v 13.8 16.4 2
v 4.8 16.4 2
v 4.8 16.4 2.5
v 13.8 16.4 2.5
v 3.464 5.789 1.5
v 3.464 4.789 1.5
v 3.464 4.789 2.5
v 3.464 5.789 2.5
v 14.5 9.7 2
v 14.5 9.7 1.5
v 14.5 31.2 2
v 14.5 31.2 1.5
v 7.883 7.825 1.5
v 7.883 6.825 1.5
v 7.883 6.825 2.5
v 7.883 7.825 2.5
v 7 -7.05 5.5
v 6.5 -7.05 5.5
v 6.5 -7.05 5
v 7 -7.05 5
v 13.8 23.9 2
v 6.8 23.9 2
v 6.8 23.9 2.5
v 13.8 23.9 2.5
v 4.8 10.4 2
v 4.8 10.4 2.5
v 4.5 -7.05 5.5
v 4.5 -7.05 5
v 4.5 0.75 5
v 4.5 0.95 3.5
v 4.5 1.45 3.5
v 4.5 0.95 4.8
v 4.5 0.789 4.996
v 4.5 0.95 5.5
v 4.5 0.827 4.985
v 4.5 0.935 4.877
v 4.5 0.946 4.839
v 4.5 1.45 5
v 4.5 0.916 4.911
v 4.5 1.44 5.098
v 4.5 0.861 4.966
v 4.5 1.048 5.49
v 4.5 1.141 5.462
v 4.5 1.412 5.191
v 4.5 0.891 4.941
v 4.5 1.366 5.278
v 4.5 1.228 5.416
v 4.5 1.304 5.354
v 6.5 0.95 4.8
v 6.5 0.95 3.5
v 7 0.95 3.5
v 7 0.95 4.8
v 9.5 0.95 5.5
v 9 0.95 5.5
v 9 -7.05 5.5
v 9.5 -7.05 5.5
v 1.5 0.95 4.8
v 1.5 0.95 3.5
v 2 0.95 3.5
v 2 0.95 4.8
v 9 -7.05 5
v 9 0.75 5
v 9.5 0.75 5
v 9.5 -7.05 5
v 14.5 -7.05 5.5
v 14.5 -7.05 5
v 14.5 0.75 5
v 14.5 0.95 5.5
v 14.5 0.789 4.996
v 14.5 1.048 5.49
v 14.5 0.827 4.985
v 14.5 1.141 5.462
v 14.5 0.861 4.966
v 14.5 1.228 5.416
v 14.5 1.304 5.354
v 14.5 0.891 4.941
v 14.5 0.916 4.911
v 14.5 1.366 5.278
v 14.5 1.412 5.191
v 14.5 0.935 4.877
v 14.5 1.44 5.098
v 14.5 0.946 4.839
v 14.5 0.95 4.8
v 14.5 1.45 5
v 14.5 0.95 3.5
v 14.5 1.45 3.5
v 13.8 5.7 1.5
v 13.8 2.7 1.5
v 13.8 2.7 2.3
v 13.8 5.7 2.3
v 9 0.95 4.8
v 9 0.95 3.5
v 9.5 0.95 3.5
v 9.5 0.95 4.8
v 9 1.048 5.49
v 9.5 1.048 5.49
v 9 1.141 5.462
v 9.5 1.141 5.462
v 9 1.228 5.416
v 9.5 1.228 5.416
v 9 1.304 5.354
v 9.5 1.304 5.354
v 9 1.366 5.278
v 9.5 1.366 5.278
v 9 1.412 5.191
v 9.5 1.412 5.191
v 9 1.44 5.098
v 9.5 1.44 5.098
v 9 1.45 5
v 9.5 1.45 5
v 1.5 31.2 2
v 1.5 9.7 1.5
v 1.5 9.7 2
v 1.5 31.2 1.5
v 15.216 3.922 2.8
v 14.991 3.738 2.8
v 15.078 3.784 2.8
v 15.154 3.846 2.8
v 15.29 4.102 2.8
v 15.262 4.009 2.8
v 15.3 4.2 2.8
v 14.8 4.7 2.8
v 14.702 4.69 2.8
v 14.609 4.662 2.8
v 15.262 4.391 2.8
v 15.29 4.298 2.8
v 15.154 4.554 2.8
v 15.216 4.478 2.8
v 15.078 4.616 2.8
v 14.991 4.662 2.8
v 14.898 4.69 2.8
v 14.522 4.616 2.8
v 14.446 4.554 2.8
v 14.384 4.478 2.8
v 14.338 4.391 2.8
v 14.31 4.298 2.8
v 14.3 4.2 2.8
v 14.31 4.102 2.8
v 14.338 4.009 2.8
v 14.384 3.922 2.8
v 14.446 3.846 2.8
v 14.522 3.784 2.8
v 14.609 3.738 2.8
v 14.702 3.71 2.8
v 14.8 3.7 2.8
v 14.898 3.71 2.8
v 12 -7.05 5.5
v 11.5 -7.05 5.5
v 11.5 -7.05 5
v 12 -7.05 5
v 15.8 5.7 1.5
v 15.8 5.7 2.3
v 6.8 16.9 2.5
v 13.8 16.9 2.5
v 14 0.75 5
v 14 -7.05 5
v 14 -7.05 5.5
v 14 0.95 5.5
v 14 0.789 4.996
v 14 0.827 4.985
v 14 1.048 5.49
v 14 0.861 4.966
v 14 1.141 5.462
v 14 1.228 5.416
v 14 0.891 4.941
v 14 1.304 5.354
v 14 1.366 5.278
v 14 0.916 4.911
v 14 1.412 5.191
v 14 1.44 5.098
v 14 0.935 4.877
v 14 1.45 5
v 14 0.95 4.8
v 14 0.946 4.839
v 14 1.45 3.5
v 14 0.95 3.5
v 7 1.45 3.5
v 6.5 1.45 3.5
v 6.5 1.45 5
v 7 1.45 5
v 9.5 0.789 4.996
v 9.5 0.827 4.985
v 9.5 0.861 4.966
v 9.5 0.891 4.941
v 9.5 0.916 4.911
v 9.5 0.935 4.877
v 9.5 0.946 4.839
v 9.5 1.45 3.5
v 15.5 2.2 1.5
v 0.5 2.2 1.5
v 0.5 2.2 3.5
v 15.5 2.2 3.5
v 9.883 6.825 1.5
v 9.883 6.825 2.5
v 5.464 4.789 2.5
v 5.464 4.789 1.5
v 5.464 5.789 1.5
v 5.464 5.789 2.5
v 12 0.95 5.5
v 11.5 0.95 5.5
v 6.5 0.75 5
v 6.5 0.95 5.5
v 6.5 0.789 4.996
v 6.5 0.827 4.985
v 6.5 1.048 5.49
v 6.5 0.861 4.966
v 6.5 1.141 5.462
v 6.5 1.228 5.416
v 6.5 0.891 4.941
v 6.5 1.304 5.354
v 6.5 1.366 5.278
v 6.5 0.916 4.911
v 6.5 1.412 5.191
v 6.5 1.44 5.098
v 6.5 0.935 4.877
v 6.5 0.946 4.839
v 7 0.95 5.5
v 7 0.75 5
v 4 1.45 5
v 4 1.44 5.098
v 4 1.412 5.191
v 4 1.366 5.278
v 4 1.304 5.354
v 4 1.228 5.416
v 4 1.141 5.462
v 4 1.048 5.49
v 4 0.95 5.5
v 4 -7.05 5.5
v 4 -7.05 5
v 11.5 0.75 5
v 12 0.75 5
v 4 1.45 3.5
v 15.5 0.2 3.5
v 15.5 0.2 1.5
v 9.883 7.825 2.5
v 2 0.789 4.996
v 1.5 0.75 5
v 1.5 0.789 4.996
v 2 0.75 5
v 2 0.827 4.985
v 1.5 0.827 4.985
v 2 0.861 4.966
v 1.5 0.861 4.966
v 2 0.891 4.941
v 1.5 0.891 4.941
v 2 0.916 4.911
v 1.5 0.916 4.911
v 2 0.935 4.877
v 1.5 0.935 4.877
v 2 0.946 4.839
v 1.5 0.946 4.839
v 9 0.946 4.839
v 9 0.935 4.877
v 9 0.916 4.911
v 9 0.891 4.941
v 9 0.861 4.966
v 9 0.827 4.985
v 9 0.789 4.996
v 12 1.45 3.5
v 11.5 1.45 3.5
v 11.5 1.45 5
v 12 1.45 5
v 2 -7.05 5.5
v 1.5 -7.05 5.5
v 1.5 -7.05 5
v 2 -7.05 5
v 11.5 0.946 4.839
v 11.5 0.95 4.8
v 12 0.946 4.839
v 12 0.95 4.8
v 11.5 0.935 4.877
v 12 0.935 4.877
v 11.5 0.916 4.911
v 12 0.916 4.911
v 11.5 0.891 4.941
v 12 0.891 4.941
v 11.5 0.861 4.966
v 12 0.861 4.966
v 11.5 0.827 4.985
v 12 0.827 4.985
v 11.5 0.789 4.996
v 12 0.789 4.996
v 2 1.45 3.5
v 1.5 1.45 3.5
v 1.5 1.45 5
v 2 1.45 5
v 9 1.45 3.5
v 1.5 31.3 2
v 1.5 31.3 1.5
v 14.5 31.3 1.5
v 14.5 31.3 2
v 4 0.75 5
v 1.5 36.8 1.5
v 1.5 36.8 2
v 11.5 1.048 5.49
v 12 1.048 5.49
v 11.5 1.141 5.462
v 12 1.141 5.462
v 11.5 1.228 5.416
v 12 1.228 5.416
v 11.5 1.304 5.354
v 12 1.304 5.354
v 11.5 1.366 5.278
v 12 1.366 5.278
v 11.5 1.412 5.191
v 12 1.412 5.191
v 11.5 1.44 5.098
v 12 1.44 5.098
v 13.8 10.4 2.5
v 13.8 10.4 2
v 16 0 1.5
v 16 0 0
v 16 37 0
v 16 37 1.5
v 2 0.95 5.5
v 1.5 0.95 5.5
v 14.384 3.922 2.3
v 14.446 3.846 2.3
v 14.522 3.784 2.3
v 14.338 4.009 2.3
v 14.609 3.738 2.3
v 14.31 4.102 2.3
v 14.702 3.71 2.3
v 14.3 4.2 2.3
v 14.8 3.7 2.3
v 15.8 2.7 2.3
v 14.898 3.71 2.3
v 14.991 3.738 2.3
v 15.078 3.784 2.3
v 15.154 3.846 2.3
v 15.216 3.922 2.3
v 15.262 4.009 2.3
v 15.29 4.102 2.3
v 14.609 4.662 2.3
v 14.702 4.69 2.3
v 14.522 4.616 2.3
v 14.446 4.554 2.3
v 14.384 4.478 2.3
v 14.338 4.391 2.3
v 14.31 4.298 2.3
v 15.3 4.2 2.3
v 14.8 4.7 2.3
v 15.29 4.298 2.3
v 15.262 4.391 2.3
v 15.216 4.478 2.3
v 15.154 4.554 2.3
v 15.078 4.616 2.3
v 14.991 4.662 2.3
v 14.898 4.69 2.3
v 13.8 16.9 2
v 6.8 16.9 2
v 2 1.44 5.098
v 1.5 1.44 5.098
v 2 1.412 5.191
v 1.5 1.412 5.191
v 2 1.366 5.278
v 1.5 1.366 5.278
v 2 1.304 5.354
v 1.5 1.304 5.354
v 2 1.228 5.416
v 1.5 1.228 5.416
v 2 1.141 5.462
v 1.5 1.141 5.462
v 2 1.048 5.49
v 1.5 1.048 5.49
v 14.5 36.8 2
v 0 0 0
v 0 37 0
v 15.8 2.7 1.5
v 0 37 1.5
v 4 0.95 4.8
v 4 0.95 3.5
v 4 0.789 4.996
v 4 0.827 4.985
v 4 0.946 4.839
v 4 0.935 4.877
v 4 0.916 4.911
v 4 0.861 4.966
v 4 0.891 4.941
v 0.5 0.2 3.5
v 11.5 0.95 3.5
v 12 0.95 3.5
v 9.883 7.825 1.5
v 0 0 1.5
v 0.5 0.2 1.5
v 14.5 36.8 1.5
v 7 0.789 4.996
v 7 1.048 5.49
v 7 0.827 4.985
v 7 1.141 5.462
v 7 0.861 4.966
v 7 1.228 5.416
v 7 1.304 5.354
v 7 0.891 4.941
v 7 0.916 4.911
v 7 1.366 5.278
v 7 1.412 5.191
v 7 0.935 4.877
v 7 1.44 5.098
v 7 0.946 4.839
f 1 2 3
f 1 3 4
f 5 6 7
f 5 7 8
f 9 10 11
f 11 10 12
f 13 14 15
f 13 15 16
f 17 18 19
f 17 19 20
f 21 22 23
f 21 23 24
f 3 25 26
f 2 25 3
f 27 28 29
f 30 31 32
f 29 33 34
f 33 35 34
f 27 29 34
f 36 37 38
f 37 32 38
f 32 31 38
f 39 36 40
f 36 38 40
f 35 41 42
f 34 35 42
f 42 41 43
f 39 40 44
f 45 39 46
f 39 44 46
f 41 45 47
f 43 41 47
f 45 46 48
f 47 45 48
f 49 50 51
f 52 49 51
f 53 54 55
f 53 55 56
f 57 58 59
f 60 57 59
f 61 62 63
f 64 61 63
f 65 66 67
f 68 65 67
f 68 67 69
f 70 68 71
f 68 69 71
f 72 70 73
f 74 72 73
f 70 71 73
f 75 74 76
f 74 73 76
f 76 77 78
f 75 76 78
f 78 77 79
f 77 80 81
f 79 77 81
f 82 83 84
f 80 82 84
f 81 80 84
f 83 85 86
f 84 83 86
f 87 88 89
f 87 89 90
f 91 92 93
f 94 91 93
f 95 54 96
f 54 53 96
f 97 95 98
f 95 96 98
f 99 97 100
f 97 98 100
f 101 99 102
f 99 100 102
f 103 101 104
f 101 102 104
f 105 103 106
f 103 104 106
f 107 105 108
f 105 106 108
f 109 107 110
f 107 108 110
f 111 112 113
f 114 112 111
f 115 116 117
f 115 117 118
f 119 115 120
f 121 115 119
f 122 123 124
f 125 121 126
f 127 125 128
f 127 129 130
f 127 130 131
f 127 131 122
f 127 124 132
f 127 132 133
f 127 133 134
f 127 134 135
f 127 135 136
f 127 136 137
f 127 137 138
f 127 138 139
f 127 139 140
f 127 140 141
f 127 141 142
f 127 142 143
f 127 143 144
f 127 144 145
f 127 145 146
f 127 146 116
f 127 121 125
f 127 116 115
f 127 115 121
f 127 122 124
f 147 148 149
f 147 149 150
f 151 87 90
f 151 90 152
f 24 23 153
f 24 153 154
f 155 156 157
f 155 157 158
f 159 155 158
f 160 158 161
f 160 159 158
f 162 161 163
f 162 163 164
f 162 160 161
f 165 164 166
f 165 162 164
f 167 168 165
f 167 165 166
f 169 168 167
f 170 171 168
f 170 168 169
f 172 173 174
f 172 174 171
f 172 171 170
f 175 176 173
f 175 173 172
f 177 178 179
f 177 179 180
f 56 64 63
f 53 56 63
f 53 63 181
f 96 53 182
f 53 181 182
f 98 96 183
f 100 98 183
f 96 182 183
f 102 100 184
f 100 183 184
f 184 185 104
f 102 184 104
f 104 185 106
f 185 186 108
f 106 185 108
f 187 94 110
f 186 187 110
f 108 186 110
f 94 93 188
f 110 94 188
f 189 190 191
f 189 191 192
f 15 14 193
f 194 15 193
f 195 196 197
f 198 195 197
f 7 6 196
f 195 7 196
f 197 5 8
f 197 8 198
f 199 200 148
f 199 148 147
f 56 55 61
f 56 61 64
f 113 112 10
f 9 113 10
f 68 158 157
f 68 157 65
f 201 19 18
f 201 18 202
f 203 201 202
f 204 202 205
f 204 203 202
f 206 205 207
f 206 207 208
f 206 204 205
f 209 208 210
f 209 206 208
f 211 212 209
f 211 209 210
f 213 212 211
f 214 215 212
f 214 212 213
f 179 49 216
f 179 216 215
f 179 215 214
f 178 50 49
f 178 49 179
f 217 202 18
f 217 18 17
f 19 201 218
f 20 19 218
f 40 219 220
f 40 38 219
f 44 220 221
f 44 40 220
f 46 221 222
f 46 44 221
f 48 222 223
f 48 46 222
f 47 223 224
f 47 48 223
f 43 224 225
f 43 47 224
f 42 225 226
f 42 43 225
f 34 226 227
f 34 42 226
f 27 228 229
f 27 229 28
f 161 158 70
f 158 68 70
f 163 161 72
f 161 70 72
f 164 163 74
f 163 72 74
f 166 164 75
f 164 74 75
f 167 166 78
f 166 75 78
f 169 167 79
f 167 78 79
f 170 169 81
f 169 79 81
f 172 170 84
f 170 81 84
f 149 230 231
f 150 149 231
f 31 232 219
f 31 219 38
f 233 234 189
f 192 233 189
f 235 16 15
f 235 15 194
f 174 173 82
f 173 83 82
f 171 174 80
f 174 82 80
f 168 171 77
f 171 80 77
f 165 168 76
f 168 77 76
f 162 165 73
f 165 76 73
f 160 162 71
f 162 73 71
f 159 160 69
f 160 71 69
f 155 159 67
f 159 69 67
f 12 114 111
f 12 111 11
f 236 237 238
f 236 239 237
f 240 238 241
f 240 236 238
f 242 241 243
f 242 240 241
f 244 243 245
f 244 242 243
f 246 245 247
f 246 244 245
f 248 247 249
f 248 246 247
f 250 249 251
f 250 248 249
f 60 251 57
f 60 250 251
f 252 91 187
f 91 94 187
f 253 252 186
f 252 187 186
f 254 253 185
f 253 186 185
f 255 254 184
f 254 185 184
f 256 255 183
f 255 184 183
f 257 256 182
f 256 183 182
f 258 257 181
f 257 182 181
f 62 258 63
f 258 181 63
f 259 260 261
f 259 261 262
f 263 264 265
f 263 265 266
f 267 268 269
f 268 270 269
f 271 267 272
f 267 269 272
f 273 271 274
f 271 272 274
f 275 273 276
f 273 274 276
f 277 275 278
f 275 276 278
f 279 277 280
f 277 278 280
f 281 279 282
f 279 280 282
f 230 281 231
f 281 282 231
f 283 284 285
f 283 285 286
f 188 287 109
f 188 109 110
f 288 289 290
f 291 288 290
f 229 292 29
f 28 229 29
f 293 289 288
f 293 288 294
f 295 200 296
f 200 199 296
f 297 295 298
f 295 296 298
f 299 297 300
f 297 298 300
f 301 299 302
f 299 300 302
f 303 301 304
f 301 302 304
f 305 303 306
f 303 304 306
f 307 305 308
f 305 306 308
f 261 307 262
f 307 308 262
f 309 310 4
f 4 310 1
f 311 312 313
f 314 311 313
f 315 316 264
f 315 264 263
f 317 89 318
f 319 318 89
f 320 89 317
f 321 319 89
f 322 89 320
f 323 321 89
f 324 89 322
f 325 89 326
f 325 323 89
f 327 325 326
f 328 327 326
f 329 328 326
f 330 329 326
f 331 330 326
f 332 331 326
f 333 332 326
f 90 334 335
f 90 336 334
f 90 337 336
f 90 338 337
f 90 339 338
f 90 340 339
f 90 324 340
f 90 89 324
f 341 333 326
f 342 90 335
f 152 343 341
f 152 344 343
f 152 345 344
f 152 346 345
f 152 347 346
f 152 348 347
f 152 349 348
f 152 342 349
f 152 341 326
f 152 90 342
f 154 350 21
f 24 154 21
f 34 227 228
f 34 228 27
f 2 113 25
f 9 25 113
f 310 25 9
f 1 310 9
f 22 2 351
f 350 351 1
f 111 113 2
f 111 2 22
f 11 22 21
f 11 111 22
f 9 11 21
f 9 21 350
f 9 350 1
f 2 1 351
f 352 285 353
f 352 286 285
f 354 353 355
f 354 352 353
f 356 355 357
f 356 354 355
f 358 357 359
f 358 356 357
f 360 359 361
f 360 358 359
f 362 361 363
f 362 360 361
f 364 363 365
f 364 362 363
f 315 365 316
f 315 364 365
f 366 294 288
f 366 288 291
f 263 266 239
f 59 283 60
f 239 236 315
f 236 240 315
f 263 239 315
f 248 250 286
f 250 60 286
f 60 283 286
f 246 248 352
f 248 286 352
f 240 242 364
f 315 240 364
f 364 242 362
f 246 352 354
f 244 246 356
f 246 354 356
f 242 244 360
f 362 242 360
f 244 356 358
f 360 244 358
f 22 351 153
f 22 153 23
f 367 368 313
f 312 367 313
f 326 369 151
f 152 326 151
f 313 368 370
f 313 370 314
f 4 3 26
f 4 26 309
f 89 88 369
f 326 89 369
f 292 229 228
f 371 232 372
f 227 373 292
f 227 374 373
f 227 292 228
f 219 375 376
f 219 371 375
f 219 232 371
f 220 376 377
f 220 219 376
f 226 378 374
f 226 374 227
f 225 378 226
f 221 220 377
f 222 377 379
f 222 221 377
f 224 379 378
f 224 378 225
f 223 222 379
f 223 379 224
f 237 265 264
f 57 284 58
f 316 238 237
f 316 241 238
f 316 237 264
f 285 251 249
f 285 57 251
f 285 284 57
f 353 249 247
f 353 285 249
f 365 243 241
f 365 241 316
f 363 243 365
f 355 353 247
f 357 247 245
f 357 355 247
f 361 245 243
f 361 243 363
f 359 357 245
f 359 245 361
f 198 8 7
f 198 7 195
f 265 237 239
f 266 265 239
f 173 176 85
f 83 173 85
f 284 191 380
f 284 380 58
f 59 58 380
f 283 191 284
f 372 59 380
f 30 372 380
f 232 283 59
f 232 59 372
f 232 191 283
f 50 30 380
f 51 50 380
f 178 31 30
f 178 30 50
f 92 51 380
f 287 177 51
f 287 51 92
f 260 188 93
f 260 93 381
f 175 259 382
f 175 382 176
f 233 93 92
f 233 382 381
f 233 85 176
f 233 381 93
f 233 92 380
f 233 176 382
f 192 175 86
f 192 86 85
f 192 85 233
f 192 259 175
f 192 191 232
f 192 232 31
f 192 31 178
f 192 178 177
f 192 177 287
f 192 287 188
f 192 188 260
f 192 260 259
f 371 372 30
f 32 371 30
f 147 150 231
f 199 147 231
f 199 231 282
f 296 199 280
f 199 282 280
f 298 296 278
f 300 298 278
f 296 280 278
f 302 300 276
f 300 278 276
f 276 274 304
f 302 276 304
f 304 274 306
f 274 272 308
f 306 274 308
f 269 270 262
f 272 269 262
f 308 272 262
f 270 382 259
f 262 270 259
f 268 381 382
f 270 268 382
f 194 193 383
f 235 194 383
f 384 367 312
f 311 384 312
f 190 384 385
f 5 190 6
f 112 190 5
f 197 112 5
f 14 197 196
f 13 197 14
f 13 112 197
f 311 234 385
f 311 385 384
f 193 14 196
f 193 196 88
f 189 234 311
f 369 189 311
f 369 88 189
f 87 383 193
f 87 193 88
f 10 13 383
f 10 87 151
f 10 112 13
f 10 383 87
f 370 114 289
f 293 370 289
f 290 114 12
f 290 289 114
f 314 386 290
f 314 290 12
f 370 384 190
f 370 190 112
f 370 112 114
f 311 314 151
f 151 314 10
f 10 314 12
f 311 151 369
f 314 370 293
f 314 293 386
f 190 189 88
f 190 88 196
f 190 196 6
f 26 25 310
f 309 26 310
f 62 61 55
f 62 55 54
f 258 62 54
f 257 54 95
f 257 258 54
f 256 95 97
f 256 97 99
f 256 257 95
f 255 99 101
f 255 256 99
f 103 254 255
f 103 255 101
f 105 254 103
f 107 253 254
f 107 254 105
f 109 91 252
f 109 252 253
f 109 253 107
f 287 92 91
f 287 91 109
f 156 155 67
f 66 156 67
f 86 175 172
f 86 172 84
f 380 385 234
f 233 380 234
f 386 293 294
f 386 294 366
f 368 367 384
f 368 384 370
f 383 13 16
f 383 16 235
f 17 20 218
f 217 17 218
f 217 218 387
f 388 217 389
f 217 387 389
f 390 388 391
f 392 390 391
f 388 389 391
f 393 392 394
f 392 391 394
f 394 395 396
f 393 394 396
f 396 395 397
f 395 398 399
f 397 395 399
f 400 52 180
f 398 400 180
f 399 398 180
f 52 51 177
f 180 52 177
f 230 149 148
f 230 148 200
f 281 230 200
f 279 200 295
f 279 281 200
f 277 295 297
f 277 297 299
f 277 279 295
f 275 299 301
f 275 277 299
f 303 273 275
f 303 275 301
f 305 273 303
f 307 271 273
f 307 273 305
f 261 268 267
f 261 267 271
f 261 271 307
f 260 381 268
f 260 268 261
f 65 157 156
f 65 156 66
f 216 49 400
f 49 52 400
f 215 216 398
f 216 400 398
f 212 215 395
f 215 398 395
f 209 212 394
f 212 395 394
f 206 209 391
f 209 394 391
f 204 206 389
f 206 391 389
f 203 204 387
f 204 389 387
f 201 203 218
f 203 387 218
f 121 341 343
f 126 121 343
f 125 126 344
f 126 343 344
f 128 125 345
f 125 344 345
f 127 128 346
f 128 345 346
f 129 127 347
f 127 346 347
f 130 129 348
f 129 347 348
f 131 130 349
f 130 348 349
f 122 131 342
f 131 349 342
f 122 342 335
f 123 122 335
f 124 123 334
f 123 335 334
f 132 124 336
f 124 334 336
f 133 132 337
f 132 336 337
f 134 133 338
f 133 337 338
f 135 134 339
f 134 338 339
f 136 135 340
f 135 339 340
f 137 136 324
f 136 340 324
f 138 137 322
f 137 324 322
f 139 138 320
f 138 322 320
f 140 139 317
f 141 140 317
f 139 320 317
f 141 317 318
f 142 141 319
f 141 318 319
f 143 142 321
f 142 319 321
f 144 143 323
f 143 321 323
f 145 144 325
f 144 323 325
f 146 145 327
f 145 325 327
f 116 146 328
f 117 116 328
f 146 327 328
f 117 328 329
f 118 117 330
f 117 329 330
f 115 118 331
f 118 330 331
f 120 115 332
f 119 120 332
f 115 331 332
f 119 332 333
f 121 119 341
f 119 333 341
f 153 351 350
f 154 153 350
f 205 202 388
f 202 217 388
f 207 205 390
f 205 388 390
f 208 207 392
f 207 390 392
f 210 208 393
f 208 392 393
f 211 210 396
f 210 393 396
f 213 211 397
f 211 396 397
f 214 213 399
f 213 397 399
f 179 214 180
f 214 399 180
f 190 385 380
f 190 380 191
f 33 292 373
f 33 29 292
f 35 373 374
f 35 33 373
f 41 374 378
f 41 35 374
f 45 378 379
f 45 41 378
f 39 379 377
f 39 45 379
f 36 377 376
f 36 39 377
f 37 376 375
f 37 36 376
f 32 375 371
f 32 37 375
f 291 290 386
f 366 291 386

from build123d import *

# Parameters (mm, degrees)
SKETCH_1_W                     = 16
SKETCH_1_H                     = 37
EXTRUDE_1_DEPTH                = 1.5
SKETCH_2_W                     = 15
SKETCH_2_H                     = 2
EXTRUDE_2_DEPTH                = 2
SKETCH_3_W                     = 0.5
SKETCH_3_H                     = 0.5
EXTRUDE_3_DEPTH                = 2
SKETCH_4_W                     = 0.5
SKETCH_4_H                     = 0.5
EXTRUDE_4_DEPTH                = 8
FILLET_2_R                     = 0.5
FILLET_3_R                     = 0.2
PATTERN_LINEAR_1_COUNT         = 6
PATTERN_LINEAR_1_PITCH         = 2.5
FILLET_2_OF_PATTERN_LINEAR_1_R = 0.5
FILLET_3_OF_PATTERN_LINEAR_1_R = 0.2
SKETCH_7_W                     = 13
SKETCH_7_H                     = 5.5
EXTRUDE_7_DEPTH                = 0.5
SKETCH_8_W                     = 13
SKETCH_8_H                     = 21.5
EXTRUDE_8_DEPTH                = 0.5
SKETCH_9_W                     = 2
SKETCH_9_H                     = 3
EXTRUDE_9_DEPTH                = 0.8
SKETCH_10_R                    = 0.5
EXTRUDE_10_DEPTH               = 0.5
SKETCH_11_W                    = 2
SKETCH_11_H                    = 1
EXTRUDE_11_DEPTH               = 1
SKETCH_12_W                    = 7
SKETCH_12_H                    = 7
SKETCH_12_W_2                  = 9
SKETCH_12_H_2                  = 6
EXTRUDE_12_DEPTH               = 0.5


with BuildPart() as part:
    # 草图1 → 凸台-拉伸1 (new body)
    with BuildSketch(Plane.XY):
        with Locations((8, 18.5)):
            Rectangle(SKETCH_1_W, SKETCH_1_H)
    extrude(amount=EXTRUDE_1_DEPTH)

    # 草图2 → 凸台-拉伸2 (add)
    with BuildSketch(Plane.XY.offset(1.5)):
        with Locations((8, 1.2)):
            Rectangle(SKETCH_2_W, SKETCH_2_H)
    extrude(amount=EXTRUDE_2_DEPTH)

    # 草图3 → 凸台-拉伸3 (add)
    with BuildSketch(Plane.XY.offset(3.5)):
        with Locations((1.75, 1.2)):
            Rectangle(SKETCH_3_W, SKETCH_3_H)
    extrude_3 = extrude(amount=EXTRUDE_3_DEPTH)

    # 草图4 → 凸台-拉伸4 (add)
    with BuildSketch(Plane.XZ.offset(-0.95)):
        with Locations((1.75, 5.25)):
            Rectangle(SKETCH_4_W, SKETCH_4_H)
    extrude_4 = extrude(amount=EXTRUDE_4_DEPTH)

    # 圆角2
    fillet_2_edges = [part.edges().sort_by_distance(p)[0] for p in [
        (1.75, 1.45, 5.5),
    ]]
    fillet(fillet_2_edges, radius=FILLET_2_R)

    # 圆角3
    fillet_3_edges = [part.edges().sort_by_distance(p)[0] for p in [
        (1.75, 0.95, 5),
    ]]
    fillet(fillet_3_edges, radius=FILLET_3_R)

    # 阵列(线性)1: 凸台-拉伸3, 凸台-拉伸4 ×6
    with Locations(*[(i * PATTERN_LINEAR_1_PITCH, 0, 0) for i in range(1, PATTERN_LINEAR_1_COUNT)]):
        add(extrude_3)
        add(extrude_4)

    # 圆角2 of 阵列(线性)1
    fillet_2_of_pattern_linear_1_edges = [part.edges().sort_by_distance(p)[0] for p in [
        (4.25, 1.45, 5.5),
        (6.75, 1.45, 5.5),
        (9.25, 1.45, 5.5),
        (11.75, 1.45, 5.5),
        (14.25, 1.45, 5.5),
    ]]
    fillet(fillet_2_of_pattern_linear_1_edges, radius=FILLET_2_OF_PATTERN_LINEAR_1_R)

    # 圆角3 of 阵列(线性)1
    fillet_3_of_pattern_linear_1_edges = [part.edges().sort_by_distance(p)[0] for p in [
        (4.25, 0.95, 5),
        (6.75, 0.95, 5),
        (9.25, 0.95, 5),
        (11.75, 0.95, 5),
        (14.25, 0.95, 5),
    ]]
    fillet(fillet_3_of_pattern_linear_1_edges, radius=FILLET_3_OF_PATTERN_LINEAR_1_R)

    # 草图7 → 凸台-拉伸7 (add)
    with BuildSketch(Plane.XY.offset(1.5)):
        with Locations((8, 34.05)):
            Rectangle(SKETCH_7_W, SKETCH_7_H)
    extrude(amount=EXTRUDE_7_DEPTH)

    # 草图8 → 凸台-拉伸8 (add)
    with BuildSketch(Plane.XY.offset(1.5)):
        with Locations((8, 20.45)):
            Rectangle(SKETCH_8_W, SKETCH_8_H)
    extrude(amount=EXTRUDE_8_DEPTH)

    # 草图9 → 凸台-拉伸9 (add)
    with BuildSketch(Plane.XY.offset(1.5)):
        with Locations((14.8, 4.2)):
            Rectangle(SKETCH_9_W, SKETCH_9_H)
    extrude(amount=EXTRUDE_9_DEPTH)

    # 草图10 → 凸台-拉伸10 (add)
    with BuildSketch(Plane.XY.offset(2.3)):
        with Locations((14.8, 4.2)):
            Circle(SKETCH_10_R)
    extrude(amount=EXTRUDE_10_DEPTH)

    # 草图11 → 凸台-拉伸11 (add)
    with BuildSketch(Plane.XY.offset(1.5)):
        with Locations((8.882624218, 7.325014272)):
            Rectangle(SKETCH_11_W, SKETCH_11_H)
        with Locations((4.464220441, 5.288706444)):
            Rectangle(SKETCH_11_W, SKETCH_11_H)
    extrude(amount=EXTRUDE_11_DEPTH)

    # 草图12 → 凸台-拉伸12 (add)
    with BuildSketch(Plane.XY.offset(2)):
        with Locations((10.3, 20.4)):
            Rectangle(SKETCH_12_W, SKETCH_12_H)
        with Locations((9.3, 13.4)):
            Rectangle(SKETCH_12_W_2, SKETCH_12_H_2)
    extrude(amount=EXTRUDE_12_DEPTH)


solid = part.part
